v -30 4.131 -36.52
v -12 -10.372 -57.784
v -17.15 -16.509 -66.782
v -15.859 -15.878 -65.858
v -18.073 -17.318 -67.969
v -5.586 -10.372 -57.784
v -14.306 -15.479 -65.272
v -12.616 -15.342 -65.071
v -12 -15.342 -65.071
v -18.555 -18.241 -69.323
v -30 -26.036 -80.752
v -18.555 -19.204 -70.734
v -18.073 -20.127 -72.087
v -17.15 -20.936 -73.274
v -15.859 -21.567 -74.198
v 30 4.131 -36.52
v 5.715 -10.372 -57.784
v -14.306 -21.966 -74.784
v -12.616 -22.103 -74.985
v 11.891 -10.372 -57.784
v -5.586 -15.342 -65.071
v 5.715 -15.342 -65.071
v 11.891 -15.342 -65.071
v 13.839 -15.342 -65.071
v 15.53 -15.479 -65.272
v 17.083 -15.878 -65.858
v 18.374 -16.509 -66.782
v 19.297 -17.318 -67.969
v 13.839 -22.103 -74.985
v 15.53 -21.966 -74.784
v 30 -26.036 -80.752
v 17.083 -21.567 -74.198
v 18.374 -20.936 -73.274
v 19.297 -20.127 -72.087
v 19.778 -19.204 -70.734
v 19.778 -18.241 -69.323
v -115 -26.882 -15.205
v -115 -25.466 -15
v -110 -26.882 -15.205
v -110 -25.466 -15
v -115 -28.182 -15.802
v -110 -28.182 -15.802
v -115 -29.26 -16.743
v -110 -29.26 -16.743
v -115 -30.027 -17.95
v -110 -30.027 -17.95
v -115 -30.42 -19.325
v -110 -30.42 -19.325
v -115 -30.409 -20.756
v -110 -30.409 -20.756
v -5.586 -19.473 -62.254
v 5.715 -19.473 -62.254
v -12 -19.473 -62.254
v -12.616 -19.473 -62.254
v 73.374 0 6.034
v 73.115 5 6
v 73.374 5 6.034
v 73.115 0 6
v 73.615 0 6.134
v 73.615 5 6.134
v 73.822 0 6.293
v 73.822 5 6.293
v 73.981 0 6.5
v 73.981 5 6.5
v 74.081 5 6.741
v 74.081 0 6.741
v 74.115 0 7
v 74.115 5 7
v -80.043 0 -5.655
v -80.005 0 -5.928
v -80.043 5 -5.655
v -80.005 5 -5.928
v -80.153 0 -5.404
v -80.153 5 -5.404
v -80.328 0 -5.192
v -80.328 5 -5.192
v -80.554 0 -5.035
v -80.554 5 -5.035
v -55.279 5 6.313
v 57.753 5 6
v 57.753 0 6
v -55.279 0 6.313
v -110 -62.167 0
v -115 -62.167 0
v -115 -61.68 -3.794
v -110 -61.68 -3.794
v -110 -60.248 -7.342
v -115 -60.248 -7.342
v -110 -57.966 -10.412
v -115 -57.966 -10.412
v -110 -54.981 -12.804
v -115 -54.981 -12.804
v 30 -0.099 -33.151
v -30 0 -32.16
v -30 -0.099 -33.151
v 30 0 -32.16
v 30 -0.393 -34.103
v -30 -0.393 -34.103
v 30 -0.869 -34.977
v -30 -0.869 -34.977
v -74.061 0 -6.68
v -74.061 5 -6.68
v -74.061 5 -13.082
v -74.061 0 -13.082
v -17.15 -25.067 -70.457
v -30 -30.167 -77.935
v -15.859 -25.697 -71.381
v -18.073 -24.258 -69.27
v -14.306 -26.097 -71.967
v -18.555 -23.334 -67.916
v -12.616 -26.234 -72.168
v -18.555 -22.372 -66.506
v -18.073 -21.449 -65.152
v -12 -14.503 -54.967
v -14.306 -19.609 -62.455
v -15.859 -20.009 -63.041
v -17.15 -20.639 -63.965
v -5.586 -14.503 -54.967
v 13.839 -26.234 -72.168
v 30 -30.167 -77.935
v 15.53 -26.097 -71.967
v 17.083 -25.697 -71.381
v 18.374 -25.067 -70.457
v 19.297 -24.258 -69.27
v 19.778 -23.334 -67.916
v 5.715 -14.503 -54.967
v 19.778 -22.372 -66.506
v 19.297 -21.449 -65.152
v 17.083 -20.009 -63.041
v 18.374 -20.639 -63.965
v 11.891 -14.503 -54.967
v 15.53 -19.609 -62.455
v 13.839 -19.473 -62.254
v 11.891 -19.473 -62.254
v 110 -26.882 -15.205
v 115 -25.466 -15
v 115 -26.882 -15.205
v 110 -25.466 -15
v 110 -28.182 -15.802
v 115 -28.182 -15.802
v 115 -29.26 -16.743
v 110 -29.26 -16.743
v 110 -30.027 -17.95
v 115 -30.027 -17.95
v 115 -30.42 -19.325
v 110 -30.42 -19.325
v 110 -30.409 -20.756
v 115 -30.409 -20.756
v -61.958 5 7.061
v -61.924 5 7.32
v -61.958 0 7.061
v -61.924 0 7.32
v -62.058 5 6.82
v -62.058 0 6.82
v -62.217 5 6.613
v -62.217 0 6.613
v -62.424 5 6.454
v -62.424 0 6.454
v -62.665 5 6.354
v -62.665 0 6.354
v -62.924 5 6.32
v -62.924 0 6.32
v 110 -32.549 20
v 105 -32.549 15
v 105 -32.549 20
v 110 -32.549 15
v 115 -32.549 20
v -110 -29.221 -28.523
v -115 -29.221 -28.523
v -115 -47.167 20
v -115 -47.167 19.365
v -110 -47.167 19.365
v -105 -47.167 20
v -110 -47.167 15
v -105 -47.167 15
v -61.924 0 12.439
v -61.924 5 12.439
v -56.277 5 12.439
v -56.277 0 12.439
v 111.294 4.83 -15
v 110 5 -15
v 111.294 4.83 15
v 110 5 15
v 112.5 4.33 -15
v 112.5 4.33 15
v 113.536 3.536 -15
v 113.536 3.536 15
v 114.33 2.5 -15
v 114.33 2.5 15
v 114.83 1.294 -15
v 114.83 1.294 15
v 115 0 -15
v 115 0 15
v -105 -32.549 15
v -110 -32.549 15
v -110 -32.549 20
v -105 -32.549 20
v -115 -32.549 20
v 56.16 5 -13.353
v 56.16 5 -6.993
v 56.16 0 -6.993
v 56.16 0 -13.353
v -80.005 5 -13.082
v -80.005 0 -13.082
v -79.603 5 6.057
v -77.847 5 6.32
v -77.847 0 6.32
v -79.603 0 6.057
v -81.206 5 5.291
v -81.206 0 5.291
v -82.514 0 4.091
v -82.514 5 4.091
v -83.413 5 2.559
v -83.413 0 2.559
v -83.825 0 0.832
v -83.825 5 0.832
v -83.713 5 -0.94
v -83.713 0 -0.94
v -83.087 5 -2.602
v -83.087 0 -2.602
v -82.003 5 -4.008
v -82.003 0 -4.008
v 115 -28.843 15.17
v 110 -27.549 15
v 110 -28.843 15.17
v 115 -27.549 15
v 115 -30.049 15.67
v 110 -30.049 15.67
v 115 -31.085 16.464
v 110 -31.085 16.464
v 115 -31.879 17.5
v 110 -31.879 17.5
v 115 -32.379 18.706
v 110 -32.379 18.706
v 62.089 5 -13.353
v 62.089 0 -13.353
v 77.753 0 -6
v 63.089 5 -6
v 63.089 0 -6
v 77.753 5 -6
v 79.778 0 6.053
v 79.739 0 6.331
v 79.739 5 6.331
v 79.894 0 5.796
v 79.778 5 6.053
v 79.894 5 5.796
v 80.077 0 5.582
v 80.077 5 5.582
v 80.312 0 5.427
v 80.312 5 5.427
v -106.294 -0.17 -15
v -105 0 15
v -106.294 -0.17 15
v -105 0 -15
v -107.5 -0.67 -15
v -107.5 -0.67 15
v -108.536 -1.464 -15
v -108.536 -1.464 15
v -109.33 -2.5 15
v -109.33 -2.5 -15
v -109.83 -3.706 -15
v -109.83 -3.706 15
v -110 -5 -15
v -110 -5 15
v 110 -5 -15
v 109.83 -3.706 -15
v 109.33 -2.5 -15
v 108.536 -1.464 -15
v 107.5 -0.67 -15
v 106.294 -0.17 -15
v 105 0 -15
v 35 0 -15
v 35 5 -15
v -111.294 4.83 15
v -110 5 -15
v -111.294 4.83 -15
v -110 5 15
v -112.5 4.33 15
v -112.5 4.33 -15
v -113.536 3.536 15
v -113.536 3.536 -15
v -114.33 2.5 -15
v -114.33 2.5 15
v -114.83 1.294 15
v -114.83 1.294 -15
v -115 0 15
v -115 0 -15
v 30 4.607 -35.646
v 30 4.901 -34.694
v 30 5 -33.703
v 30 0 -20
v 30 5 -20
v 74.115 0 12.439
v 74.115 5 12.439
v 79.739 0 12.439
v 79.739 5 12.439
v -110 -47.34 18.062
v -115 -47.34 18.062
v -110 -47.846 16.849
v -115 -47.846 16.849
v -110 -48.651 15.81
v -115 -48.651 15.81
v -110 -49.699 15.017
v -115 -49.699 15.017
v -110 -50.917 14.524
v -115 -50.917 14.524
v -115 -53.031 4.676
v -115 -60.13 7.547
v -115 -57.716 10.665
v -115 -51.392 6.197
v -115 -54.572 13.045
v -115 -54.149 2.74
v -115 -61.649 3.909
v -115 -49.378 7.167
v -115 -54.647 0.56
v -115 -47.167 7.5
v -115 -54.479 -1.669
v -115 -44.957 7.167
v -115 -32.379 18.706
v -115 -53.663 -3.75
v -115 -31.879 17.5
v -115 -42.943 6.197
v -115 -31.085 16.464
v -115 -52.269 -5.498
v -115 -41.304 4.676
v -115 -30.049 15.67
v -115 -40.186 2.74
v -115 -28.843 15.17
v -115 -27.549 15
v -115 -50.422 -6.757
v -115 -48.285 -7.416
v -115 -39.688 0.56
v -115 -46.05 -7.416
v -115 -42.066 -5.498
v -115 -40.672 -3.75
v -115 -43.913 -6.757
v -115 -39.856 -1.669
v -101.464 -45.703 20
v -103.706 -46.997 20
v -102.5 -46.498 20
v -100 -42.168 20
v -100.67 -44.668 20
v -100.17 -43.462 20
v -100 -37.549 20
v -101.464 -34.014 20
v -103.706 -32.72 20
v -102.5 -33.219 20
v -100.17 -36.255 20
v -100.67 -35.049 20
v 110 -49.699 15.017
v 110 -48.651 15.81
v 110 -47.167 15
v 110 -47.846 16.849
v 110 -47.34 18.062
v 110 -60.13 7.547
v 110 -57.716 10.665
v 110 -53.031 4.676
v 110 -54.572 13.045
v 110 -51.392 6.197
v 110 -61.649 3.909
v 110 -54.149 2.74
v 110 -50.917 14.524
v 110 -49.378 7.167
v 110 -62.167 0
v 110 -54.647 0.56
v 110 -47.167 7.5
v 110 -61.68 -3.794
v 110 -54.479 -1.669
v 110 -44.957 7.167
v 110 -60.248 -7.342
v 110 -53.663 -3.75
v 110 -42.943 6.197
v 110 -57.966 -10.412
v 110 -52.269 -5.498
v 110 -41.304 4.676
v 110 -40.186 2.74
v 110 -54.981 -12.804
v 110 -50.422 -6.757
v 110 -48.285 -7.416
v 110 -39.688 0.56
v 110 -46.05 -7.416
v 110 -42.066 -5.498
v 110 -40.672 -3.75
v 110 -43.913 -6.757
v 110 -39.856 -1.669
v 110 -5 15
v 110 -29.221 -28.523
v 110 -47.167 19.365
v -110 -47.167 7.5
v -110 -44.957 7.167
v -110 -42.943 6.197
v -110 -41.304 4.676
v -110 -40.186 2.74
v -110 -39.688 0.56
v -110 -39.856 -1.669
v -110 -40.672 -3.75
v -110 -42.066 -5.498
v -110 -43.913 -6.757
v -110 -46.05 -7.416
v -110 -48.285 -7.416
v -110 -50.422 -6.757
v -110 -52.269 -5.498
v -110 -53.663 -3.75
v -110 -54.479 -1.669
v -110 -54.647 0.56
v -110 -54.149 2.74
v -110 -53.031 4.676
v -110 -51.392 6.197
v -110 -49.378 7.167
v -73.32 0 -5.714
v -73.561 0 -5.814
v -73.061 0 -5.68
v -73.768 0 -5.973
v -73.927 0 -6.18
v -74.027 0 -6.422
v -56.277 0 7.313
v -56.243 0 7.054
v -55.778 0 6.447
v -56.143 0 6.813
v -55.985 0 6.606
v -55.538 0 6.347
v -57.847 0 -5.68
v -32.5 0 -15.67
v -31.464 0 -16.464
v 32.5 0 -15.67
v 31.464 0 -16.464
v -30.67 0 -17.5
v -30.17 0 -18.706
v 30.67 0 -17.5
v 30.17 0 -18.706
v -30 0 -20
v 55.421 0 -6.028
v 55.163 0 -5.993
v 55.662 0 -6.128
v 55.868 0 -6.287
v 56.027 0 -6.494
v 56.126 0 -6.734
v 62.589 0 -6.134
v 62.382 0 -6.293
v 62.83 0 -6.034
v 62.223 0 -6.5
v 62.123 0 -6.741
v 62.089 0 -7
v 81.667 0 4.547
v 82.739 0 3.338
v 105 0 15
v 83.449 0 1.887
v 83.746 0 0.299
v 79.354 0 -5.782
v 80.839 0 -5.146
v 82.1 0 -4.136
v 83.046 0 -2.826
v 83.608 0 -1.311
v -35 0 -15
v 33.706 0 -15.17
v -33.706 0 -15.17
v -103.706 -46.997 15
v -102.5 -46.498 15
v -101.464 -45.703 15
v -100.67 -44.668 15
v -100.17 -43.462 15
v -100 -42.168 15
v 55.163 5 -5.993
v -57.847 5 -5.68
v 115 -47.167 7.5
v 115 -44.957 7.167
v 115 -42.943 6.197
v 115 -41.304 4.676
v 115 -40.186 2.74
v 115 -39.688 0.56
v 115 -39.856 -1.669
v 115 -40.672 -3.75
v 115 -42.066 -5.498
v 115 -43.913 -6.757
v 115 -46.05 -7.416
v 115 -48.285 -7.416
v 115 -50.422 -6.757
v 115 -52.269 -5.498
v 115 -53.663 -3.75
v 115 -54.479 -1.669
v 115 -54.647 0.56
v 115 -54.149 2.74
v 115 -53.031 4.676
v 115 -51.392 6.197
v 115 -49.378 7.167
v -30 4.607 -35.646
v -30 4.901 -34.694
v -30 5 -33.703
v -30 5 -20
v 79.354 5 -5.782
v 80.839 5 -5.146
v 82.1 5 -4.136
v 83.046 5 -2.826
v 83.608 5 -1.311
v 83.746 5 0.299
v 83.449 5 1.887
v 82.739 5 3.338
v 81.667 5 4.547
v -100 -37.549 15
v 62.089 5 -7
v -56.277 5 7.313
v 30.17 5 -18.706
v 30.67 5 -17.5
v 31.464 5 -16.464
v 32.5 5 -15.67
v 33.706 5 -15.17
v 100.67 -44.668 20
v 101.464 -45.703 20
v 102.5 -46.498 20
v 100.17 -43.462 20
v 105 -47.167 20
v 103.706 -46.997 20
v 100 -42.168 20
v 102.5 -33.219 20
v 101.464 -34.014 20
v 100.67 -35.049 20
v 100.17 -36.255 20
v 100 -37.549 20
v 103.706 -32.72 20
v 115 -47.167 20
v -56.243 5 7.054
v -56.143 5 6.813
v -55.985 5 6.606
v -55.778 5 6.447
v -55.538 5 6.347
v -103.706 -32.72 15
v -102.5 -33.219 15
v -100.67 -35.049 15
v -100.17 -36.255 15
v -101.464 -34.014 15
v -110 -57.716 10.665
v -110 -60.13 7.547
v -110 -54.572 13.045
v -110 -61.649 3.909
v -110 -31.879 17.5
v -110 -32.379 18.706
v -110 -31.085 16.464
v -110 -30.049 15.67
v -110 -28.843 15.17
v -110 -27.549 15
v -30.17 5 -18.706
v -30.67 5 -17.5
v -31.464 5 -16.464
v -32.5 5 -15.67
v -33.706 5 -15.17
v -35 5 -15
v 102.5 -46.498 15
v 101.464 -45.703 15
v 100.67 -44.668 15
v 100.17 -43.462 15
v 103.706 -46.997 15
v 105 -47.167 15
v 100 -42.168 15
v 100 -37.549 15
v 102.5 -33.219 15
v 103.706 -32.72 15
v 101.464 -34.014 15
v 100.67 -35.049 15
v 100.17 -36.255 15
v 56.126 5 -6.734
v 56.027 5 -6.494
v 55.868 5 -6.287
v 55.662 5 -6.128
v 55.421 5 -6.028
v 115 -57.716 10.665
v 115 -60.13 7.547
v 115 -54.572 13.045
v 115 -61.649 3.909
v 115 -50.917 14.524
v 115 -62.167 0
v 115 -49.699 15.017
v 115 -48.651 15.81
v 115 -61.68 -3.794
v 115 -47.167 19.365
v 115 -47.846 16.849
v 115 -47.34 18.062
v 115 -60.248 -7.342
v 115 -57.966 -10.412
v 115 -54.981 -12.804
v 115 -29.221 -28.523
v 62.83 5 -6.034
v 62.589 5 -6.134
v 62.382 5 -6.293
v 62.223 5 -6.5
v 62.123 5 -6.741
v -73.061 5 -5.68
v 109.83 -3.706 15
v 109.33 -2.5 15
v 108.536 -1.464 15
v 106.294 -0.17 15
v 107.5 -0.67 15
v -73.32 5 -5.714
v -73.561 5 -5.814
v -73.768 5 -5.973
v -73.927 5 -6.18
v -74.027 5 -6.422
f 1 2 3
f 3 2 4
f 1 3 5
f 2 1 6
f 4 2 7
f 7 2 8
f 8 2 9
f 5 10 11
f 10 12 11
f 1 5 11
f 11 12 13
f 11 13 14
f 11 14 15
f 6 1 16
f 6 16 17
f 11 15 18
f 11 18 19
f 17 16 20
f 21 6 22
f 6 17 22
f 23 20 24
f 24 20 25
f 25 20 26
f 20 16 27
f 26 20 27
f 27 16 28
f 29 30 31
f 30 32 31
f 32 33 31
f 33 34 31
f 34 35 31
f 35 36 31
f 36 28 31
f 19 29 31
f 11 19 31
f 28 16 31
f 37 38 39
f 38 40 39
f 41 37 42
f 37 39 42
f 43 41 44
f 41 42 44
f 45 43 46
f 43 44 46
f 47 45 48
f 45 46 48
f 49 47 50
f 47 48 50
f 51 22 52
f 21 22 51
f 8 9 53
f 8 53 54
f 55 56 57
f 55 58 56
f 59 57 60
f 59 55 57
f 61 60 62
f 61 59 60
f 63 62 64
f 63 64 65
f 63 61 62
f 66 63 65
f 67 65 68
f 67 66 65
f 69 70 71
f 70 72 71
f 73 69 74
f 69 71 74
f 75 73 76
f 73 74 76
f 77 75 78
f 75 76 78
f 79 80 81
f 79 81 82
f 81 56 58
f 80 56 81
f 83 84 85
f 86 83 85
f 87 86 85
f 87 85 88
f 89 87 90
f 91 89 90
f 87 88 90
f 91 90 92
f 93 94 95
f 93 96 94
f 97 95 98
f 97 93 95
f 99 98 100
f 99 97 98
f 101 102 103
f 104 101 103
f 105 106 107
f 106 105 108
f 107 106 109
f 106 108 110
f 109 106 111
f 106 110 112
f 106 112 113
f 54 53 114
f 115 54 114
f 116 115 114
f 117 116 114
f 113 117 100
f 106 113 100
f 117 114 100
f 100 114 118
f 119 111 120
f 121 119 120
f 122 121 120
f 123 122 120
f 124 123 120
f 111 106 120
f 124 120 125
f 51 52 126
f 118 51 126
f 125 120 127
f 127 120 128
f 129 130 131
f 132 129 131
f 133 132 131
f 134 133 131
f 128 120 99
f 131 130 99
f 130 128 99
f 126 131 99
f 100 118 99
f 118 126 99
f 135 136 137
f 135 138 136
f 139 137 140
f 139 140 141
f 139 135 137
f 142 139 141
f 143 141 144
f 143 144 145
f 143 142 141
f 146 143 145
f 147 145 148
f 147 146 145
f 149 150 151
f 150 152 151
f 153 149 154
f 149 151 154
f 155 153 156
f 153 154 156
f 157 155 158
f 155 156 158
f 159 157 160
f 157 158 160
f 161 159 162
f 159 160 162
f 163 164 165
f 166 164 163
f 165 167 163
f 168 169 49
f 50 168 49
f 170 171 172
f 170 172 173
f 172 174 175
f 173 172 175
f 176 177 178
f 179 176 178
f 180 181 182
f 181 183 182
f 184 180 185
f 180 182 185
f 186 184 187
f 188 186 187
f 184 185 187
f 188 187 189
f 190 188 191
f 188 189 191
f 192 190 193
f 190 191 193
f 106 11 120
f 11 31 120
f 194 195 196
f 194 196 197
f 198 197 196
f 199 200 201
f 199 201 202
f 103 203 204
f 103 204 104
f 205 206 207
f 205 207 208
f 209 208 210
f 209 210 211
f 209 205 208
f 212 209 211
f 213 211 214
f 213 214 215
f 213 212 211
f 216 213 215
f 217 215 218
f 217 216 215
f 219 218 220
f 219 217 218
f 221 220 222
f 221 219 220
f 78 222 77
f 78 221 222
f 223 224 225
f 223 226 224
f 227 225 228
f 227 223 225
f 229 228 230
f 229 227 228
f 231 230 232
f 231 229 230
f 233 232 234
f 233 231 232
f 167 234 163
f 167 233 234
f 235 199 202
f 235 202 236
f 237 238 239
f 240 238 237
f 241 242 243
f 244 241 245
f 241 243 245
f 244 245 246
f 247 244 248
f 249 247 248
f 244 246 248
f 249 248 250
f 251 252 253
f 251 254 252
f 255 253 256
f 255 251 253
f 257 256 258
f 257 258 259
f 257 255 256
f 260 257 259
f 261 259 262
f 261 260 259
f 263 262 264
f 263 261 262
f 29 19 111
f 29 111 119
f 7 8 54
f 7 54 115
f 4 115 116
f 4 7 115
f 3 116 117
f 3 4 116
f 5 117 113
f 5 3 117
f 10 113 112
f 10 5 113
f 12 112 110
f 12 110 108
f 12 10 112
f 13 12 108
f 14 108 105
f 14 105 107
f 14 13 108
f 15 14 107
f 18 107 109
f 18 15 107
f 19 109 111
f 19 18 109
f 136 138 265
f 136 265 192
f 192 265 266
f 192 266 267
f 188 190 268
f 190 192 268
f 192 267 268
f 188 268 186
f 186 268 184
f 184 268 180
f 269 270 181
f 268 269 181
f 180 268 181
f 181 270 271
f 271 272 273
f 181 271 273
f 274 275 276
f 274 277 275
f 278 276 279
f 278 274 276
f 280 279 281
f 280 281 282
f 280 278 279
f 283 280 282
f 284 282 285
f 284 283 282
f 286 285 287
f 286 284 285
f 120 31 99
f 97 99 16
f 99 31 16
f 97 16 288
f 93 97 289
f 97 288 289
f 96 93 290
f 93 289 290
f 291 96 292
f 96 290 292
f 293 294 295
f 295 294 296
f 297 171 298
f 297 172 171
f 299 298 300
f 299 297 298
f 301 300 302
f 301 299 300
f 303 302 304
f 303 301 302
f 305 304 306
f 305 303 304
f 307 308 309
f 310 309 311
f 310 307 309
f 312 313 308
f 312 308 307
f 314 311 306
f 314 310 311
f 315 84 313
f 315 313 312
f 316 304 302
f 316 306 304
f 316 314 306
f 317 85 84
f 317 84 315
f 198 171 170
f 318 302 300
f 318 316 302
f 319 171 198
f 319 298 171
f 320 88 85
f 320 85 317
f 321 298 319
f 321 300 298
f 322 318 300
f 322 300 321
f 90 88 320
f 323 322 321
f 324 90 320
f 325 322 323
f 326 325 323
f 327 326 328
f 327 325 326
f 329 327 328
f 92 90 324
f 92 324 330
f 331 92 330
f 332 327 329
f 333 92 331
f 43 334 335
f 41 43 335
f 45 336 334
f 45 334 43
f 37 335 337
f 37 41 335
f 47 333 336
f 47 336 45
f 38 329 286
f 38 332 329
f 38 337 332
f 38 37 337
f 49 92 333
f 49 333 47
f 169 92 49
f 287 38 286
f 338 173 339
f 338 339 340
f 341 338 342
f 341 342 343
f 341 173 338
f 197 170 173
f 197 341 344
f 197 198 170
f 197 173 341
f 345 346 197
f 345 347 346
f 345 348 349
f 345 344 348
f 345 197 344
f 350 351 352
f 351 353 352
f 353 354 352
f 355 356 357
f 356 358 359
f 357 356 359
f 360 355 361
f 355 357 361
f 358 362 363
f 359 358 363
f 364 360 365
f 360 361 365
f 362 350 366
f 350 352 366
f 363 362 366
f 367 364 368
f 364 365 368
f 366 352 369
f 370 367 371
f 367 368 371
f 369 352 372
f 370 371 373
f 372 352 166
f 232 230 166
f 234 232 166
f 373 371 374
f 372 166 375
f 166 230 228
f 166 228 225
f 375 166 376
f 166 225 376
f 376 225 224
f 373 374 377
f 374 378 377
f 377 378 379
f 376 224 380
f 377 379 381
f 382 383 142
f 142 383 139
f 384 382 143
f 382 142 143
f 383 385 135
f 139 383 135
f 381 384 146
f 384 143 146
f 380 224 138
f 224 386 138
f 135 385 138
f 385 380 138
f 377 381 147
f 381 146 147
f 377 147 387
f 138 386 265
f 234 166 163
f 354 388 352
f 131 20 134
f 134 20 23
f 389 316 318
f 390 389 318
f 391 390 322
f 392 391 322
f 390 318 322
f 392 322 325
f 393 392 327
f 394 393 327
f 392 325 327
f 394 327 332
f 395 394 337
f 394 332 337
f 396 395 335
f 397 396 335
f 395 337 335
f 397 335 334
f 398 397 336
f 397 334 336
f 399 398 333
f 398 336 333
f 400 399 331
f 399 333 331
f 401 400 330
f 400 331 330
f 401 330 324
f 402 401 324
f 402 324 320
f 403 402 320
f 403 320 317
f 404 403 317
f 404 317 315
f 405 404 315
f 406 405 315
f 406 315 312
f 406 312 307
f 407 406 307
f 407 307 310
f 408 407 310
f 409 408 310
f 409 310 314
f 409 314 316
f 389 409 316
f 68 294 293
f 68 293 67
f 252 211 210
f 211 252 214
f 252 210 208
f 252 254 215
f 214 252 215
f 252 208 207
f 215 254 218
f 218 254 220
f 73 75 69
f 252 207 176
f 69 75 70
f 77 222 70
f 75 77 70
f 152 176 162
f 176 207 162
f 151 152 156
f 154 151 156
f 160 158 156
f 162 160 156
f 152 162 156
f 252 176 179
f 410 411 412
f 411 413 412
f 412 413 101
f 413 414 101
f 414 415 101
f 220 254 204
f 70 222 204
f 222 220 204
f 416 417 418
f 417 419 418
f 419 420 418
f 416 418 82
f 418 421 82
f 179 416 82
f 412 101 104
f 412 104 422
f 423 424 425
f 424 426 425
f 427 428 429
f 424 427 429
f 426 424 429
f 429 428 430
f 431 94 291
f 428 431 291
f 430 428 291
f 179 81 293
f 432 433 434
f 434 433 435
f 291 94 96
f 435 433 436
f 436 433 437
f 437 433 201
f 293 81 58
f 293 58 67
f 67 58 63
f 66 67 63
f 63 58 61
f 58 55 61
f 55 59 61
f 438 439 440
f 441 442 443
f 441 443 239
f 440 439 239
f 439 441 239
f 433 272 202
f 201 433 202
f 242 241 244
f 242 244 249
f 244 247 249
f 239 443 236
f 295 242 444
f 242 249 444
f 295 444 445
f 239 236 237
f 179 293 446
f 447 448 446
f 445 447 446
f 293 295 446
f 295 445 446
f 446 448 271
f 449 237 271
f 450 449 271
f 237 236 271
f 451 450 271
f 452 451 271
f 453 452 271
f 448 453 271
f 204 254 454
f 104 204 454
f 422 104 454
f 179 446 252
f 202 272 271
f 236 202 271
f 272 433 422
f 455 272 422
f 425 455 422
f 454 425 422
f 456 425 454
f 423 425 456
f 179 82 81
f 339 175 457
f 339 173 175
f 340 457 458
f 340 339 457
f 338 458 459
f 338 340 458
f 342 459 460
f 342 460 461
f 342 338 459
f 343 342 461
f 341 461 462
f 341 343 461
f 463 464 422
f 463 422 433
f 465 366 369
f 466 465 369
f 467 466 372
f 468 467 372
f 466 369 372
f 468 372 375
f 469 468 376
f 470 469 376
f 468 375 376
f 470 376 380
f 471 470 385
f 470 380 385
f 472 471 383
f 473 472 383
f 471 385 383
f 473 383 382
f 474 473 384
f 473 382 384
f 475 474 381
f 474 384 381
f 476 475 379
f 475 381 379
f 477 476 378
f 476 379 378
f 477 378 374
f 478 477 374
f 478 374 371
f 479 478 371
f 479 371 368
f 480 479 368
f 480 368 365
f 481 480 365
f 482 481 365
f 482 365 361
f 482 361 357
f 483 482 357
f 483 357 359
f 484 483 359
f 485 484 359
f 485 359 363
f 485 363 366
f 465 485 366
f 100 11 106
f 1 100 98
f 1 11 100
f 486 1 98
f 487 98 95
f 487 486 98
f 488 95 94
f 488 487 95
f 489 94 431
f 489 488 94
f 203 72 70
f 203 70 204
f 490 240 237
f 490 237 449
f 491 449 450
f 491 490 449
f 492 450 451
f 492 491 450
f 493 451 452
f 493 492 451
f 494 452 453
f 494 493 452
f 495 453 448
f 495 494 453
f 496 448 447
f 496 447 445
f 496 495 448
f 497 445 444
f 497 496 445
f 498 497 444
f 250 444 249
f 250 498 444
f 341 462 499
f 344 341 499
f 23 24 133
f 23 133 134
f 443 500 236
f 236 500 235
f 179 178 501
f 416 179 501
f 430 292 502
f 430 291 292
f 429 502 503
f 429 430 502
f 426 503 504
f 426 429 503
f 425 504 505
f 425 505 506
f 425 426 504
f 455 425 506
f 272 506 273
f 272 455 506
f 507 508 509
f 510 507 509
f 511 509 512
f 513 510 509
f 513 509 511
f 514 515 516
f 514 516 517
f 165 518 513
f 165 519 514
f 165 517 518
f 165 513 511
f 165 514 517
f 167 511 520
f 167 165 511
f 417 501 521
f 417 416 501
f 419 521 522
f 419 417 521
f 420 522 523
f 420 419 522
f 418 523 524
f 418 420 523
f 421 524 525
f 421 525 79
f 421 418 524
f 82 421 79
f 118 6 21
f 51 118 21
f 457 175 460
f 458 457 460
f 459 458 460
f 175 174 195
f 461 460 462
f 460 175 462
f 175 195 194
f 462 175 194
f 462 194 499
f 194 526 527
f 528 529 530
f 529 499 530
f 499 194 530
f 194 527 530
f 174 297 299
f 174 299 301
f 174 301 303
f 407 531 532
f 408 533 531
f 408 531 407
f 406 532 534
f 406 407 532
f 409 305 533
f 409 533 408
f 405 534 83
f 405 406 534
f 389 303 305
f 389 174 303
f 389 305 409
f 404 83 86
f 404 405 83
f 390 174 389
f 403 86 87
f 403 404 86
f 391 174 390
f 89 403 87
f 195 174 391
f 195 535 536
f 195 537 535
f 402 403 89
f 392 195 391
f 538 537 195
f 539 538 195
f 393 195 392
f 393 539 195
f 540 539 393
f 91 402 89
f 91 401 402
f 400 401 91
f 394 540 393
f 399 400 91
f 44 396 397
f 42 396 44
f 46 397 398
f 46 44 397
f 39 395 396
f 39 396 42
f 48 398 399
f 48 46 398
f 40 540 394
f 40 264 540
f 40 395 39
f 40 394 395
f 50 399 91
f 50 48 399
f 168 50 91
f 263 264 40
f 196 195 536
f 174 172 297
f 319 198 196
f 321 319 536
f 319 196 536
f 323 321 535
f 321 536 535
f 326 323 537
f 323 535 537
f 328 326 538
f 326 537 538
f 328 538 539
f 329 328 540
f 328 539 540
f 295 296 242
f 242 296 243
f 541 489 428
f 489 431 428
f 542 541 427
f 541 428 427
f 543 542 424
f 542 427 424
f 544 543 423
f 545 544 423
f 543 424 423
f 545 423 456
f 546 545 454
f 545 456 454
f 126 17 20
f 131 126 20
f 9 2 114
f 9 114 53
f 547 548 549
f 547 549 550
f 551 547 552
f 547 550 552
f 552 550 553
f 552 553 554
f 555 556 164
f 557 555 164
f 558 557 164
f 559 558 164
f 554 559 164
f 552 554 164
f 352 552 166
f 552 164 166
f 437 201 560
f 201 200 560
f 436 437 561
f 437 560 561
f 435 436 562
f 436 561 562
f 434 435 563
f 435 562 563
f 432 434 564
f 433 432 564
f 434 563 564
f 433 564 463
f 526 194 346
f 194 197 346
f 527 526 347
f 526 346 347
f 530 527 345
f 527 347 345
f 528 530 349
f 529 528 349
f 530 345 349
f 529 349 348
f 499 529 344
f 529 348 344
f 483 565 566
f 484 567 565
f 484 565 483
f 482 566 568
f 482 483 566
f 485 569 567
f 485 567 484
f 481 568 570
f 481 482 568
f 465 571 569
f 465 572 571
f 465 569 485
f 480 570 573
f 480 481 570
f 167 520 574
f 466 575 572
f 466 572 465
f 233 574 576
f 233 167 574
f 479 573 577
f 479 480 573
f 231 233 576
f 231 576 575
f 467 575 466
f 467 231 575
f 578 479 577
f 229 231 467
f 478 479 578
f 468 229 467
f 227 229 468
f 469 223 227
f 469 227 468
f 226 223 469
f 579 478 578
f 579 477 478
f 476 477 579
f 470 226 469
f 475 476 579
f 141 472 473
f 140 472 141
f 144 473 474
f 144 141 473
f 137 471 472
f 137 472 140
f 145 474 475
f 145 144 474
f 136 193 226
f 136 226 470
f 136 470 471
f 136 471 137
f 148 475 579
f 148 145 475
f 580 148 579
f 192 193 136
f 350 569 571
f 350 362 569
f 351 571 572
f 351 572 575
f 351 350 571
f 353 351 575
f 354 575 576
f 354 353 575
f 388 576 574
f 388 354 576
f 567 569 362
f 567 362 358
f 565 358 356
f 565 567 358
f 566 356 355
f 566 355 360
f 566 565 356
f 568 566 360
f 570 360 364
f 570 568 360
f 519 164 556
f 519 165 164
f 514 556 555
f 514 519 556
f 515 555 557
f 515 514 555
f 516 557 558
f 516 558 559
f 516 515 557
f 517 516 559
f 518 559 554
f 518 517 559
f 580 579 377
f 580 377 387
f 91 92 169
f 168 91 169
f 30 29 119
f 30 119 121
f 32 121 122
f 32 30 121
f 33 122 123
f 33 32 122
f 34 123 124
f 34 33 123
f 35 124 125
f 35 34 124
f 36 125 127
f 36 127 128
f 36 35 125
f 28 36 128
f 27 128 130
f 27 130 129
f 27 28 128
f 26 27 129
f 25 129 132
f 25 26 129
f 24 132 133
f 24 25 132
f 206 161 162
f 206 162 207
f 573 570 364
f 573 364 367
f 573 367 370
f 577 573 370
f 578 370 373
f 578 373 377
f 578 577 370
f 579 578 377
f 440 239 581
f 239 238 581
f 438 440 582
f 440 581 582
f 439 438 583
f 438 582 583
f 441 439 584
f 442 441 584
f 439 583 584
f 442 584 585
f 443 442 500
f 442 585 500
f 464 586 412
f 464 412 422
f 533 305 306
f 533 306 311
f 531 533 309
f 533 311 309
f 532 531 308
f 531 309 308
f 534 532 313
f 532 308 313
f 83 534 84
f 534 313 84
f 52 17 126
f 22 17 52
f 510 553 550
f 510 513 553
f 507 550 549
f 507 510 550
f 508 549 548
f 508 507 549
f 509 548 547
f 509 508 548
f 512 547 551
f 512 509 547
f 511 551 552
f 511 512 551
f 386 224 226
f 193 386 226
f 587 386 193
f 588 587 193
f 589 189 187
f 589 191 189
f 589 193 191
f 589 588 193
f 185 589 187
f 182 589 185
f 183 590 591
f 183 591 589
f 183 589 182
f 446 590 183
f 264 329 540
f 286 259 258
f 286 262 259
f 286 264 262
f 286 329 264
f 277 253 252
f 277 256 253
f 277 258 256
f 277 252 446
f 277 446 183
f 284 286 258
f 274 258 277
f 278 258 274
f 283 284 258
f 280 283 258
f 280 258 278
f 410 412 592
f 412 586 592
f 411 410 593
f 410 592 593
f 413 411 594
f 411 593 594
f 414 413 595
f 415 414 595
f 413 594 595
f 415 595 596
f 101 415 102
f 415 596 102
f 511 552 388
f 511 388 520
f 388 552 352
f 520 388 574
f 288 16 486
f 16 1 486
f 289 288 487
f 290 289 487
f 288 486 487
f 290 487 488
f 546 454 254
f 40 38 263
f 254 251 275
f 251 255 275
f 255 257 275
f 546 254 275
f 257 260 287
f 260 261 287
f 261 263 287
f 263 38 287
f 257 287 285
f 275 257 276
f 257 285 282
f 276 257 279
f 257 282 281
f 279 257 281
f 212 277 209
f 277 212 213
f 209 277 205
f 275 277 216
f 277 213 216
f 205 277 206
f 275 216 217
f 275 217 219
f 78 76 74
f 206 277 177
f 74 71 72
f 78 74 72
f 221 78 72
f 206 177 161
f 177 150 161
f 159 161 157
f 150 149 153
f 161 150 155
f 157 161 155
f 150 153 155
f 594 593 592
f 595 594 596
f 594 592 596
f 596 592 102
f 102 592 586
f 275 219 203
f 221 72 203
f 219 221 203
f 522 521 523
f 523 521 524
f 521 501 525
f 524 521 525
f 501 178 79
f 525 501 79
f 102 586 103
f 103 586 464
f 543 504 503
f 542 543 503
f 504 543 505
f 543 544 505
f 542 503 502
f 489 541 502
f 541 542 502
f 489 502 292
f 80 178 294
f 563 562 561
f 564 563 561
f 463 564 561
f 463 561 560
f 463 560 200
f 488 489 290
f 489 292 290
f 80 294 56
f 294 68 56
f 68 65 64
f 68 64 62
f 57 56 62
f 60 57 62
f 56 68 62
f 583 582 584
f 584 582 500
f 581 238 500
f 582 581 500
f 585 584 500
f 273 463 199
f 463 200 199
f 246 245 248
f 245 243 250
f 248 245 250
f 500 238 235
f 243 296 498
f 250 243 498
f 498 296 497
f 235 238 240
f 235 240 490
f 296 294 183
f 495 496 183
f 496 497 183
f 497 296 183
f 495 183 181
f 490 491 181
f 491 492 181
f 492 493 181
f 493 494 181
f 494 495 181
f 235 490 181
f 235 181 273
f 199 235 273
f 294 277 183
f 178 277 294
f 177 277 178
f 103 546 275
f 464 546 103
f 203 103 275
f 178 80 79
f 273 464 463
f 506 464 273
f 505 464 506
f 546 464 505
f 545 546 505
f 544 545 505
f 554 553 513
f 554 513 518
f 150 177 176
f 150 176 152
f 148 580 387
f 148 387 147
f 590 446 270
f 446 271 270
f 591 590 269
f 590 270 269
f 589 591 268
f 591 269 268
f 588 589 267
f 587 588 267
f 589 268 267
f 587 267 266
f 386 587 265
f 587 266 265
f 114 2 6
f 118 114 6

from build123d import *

# Parameters (mm, degrees)
SKETCH1_W           = 220
SKETCH1_H           = 30
BOSS_EXTRUDE1_DEPTH = 5
SKETCH2_W           = 30
SKETCH2_H           = 70
BOSS_EXTRUDE2_DEPTH = 5
CUT_EXTRUDE1_DEPTH  = 10
BOSS_EXTRUDE3_DEPTH = 5
BOSS_EXTRUDE4_DEPTH = 30
FILLET1_R           = 5
SKETCH7_R           = 7.5
CUT_EXTRUDE2_DEPTH  = 253
SKETCH8_W           = 15
SKETCH8_H           = 14.618243145
BOSS_EXTRUDE5_DEPTH = 5
FILLET2_R           = 5
CUT_EXTRUDE3_DEPTH  = 5
SKETCH10_W          = 5.944140112
SKETCH10_H          = 11.167837108
SKETCH10_W_2        = 5.92832961
SKETCH10_H_2        = 9.506983552
CUT_EXTRUDE4_DEPTH  = 5
SKETCH11_W          = 5.623434756
SKETCH11_H          = 8.337110403
SKETCH11_W_2        = 5.64698147
SKETCH11_H_2        = 9.10404701
CUT_EXTRUDE5_DEPTH  = 5
FILLET3_R           = 1
CUT_EXTRUDE6_DEPTH  = 5
SKETCH13_W          = 6.176524638
SKETCH13_H          = 11.481735796
SKETCH13_W_2        = 6.413794009
SKETCH13_H_2        = 10.832022022
CUT_EXTRUDE7_DEPTH  = 5


with BuildPart() as part:
    # Sketch1 → Boss-Extrude1 (new body)
    with BuildSketch(Plane(origin=(0, 0, 0), x_dir=(1, 0, 0), z_dir=(0, 1, 0))):
        Rectangle(SKETCH1_W, SKETCH1_H)
    extrude(amount=BOSS_EXTRUDE1_DEPTH)

    # Sketch2 → Boss-Extrude2 (add)
    with BuildSketch(Plane.ZY.offset(110)):
        with Locations((0, -30)):
            Rectangle(SKETCH2_W, SKETCH2_H)
    boss_extrude2 = extrude(amount=BOSS_EXTRUDE2_DEPTH)

    # Mirror1: Boss-Extrude2 across plane
    add(boss_extrude2.mirror(Plane(origin=(0, 0, 0), x_dir=(0, 0, 1), z_dir=(1, 0, 0))))

    # Sketch4 → Cut-Extrude1 (cut)
    with BuildSketch(Plane.ZY.offset(115)):
        with BuildLine():
            Line((-15, -47.167473829), (-15, -65))
            Line((-15, -65), (15, -65))
            Line((15, -65), (15, -47.167473829))
            ThreePointArc((15, -47.167473829), (0, -62.167473829), (-15, -47.167473829))
        make_face()
    cut_extrude1 = extrude(amount=-CUT_EXTRUDE1_DEPTH, mode=Mode.SUBTRACT)

    # Mirror2: Cut-Extrude1 across plane
    add(cut_extrude1.mirror(Plane(origin=(0, 0, 0), x_dir=(0, 0, 1), z_dir=(1, 0, 0))), mode=Mode.SUBTRACT)

    # Sketch5 → Boss-Extrude3 (add)
    with BuildSketch(Plane(origin=(115, 0, 0), x_dir=(0, 0, -1), z_dir=(1, 0, 0))):
        with BuildLine():
            Line((28.523256762, -29.22115135), (15, -31.288780588))
            Line((15, -31.288780588), (-5.201478884, -40.890888071))
            Line((-5.201478884, -40.890888071), (-4.123987776, -59.07486744))
            Line((-4.123987776, -59.07486744), (0, -62.167473829))
            ThreePointArc((0, -62.167473829), (7.341637998, -60.248007132), (12.804338712, -54.98085403))
            Line((12.804338712, -54.98085403), (28.523256762, -29.22115135))
        make_face()
    boss_extrude3 = extrude(amount=-BOSS_EXTRUDE3_DEPTH)

    # Mirror3: Boss-Extrude3 across plane
    add(boss_extrude3.mirror(Plane(origin=(0, 0, 0), x_dir=(0, 0, 1), z_dir=(1, 0, 0))))

    # Sketch6 → Boss-Extrude4 (add, symmetric)
    with BuildSketch(Plane(origin=(0, 0, 0), x_dir=(0, 0, -1), z_dir=(1, 0, 0))):
        Polygon((12.470905957, 5), (35.245651902, 5), (80.752027939, -26.036386601), (77.934766812, -30.167129844), (33.702918166, 0), (12.470905957, 0), align=None)
    extrude(amount=BOSS_EXTRUDE4_DEPTH, both=True)

    # Fillet1
    fillet1_edges = [part.edges().sort_by_distance(p)[0] for p in [
        (-112.5, -31.288780588, -15),
        (0, 5, -35.245651902),
        (-30, 2.5, -15),
        (0, 0, -33.702918166),
        (30, 2.5, -15),
        (-115, 5, 0),
        (115, 5, 0),
        (-110, 0, 0),
        (110, 0, 0),
        (112.5, -31.288780588, -15),
    ]]
    fillet(fillet1_edges, radius=FILLET1_R)

    # Sketch7 → Cut-Extrude2 (cut)
    with BuildSketch(Plane.ZY.offset(115)):
        with Locations((0, -47.167473829)):
            Circle(SKETCH7_R)
    extrude(amount=-CUT_EXTRUDE2_DEPTH, mode=Mode.SUBTRACT)

    # Sketch8 → Boss-Extrude5 (add)
    with BuildSketch(Plane.XY.offset(15)):
        with Locations((-107.5, -39.858352256)):
            Rectangle(SKETCH8_W, SKETCH8_H)
        with Locations((107.5, -39.858352256)):
            Rectangle(SKETCH8_W, SKETCH8_H)
    extrude(amount=BOSS_EXTRUDE5_DEPTH)

    # Fillet2
    fillet2_edges = [part.edges().sort_by_distance(p)[0] for p in [
        (100, -47.167473829, 17.5),
        (100, -32.549230684, 17.5),
        (112.5, -32.549230684, 15),
        (112.5, -47.167473829, 15),
        (-100, -47.167473829, 17.5),
        (-100, -32.549230684, 17.5),
        (-112.5, -47.167473829, 15),
        (-112.5, -32.549230684, 15),
    ]]
    fillet(fillet2_edges, radius=FILLET2_R - 0.0001)  # a hair under: the kernel refuses the full size

    # Sketch9 → Cut-Extrude3 (cut)
    with BuildSketch(Plane(origin=(0, 5, 0), x_dir=(1, 0, 0), z_dir=(0, 1, 0))):
        with BuildLine():
            Line((-77.846940142, 5.680355486), (-57.846940142, 5.680355486))
            Line((-57.846940142, 5.680355486), (57.752992387, 6))
            Line((57.752992387, 6), (77.752992387, 6))
            ThreePointArc((77.752992387, 6), (83.752992387, 0), (77.752992387, -6))
            Line((77.752992387, -6), (57.752992387, -6))
            Line((57.752992387, -6), (-57.846940142, -6.319644514))
            Line((-57.846940142, -6.319644514), (-77.846940142, -6.319644514))
            ThreePointArc((-77.846940142, -6.319644514), (-83.846940142, -0.319644514), (-77.846940142, 5.680355486))
        make_face()
    extrude(amount=-CUT_EXTRUDE3_DEPTH, mode=Mode.SUBTRACT)

    # Sketch10 → Cut-Extrude4 (cut)
    with BuildSketch(Plane(origin=(0, 5, 0), x_dir=(1, 0, 0), z_dir=(0, 1, 0))):
        with Locations((-77.032885662, 7.498184757)):
            Rectangle(SKETCH10_W, SKETCH10_H)
        with Locations((59.124549755, 8.599122626)):
            Rectangle(SKETCH10_W_2, SKETCH10_H_2)
    extrude(amount=-CUT_EXTRUDE4_DEPTH, mode=Mode.SUBTRACT)

    # Sketch11 → Cut-Extrude5 (cut)
    with BuildSketch(Plane(origin=(0, 5, 0), x_dir=(1, 0, 0), z_dir=(0, 1, 0))):
        with Locations((76.926952234, -8.270502887)):
            Rectangle(SKETCH11_W, SKETCH11_H)
        with Locations((-59.100127848, -7.887034583)):
            Rectangle(SKETCH11_W_2, SKETCH11_H_2)
    extrude(amount=-CUT_EXTRUDE5_DEPTH, mode=Mode.SUBTRACT)

    # Fillet3
    fillet3_edges = [part.edges().sort_by_distance(p)[0] for p in [
        (-80.004955718, 2.5, -5.278834634),
        (62.08871456, 2.5, -6),
        (56.16038495, 2.5, -5.995596293),
        (-74.060815606, 2.5, -5.680355486),
        (-61.923618583, 2.5, 6.319644514),
        (-56.276637113, 2.5, 6.31530248),
        (74.115234856, 2.5, 6),
        (79.738669612, 2.5, 5.661897735),
    ]]
    fillet(fillet3_edges, radius=FILLET3_R)

    # Sketch12 → Cut-Extrude6 (cut)
    with BuildSketch(Plane(origin=(0, 19.819293064, -13.51721001), x_dir=(1, 0, 0), z_dir=(0, 0.8261486486486485, -0.563452225424669))):
        with BuildLine():
            Line((13.839167564, 62.402963996), (-12.615635754, 62.402963996))
            ThreePointArc((-12.615635754, 62.402963996), (-18.615635754, 68.402963996), (-12.615635754, 74.402963996))
            Line((-12.615635754, 74.402963996), (13.839167564, 74.402963996))
            ThreePointArc((13.839167564, 74.402963996), (19.839167564, 68.402963996), (13.839167564, 62.402963996))
        make_face()
    extrude(amount=-CUT_EXTRUDE6_DEPTH, mode=Mode.SUBTRACT)

    # Sketch13 → Cut-Extrude7 (cut)
    with BuildSketch(Plane(origin=(0, 19.819293064, -13.51721001), x_dir=(1, 0, 0), z_dir=(0, 0.8261486486486485, -0.563452225424669))):
        with Locations((8.803081479, 59.323306986)):
            Rectangle(SKETCH13_W, SKETCH13_H)
        with Locations((-8.792921623, 58.998450099)):
            Rectangle(SKETCH13_W_2, SKETCH13_H_2)
    extrude(amount=-CUT_EXTRUDE7_DEPTH, mode=Mode.SUBTRACT)


solid = part.part
